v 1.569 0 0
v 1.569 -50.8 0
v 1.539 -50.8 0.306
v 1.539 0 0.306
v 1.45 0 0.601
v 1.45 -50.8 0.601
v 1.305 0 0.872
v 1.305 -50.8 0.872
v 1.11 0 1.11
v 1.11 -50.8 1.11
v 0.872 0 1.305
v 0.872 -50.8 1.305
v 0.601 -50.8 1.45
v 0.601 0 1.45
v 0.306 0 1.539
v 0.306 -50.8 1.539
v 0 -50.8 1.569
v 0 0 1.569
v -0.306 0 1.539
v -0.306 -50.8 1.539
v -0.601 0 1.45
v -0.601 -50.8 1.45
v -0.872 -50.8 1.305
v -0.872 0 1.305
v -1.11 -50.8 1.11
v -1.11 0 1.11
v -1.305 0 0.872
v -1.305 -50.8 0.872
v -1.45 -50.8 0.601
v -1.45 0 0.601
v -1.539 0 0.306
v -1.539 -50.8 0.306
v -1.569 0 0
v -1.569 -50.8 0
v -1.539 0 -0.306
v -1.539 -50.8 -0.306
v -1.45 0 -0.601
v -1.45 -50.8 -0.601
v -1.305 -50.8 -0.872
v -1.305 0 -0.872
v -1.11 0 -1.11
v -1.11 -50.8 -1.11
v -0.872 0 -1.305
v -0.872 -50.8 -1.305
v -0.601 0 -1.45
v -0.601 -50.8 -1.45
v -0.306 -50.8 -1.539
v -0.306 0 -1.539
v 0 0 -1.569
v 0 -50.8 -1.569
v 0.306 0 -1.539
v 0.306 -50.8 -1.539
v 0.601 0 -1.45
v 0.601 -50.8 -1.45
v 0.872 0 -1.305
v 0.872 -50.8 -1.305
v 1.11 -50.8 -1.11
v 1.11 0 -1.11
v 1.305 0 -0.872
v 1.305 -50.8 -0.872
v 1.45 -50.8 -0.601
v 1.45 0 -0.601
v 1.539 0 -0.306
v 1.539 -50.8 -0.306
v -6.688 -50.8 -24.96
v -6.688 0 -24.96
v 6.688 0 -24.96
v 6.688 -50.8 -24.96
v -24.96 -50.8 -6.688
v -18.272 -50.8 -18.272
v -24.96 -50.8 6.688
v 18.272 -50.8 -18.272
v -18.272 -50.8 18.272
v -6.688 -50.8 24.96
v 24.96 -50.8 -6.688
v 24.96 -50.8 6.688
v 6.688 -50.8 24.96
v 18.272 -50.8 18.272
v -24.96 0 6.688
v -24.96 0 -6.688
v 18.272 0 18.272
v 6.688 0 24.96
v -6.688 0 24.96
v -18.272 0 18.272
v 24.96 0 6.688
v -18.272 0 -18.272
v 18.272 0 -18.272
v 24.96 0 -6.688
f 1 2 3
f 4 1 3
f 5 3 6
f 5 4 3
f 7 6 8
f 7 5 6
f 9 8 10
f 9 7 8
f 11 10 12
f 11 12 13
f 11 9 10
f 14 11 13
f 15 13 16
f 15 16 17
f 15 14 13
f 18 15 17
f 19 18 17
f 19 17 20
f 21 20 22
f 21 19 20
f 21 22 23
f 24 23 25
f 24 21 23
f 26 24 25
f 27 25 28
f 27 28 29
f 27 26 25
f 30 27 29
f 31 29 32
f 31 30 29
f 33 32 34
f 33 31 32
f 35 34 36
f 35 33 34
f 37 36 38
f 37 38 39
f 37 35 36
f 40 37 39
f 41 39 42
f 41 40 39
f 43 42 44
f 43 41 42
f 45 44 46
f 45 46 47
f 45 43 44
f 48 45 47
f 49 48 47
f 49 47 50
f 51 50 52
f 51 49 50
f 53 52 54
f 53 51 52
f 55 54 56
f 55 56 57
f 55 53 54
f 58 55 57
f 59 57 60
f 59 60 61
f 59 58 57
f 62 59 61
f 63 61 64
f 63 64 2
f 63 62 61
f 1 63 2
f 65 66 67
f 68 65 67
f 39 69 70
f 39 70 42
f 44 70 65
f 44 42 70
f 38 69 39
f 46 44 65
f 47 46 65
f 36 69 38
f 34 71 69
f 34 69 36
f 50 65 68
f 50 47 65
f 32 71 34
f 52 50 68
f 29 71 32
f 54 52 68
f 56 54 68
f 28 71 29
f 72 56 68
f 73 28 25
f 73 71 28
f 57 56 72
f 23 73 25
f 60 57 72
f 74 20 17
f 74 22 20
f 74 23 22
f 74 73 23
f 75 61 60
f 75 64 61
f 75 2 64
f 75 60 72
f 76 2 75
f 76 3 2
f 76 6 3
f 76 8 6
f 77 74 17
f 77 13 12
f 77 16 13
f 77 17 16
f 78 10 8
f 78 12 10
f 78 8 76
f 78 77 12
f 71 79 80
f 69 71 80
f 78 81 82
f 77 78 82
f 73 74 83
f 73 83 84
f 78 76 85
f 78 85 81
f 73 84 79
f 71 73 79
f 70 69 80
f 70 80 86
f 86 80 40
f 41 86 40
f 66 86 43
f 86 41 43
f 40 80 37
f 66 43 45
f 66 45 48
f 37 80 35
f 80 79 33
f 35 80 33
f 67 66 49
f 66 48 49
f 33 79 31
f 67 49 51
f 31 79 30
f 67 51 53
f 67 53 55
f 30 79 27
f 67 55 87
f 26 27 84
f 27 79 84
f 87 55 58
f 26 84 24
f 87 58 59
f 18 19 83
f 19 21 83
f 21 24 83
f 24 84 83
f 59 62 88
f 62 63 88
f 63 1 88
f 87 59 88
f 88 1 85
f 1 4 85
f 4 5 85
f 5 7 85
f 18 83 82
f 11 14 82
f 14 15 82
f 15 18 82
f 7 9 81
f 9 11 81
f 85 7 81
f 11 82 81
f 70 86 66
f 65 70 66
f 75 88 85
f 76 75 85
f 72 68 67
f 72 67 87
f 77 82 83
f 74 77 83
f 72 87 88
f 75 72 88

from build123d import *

# Parameters (mm, degrees)
F0_R     = 1.5694812218
F1_DEPTH = 50.8


# Not quite as in the source:
# - a feature names something its author has since deleted; it is built from what else it names


with BuildPart() as f1:
    # F0 (on Front) → F1 (new body)
    with BuildSketch(Plane.XZ):
        Polygon((6.6879468774, 24.9597575449), (-6.6879468774, 24.9597575449), (-18.2718106675, 18.2718106675), (-24.9597575449, 6.6879468774), (-24.9597575449, -6.6879468774), (-18.2718106675, -18.2718106675), (-6.6879468774, -24.9597575449), (6.6879468774, -24.9597575449), (18.2718106675, -18.2718106675), (24.9597575449, -6.6879468774), (24.9597575449, 6.6879468774), (18.2718106675, 18.2718106675), align=None)
        Circle(F0_R, mode=Mode.SUBTRACT)
    extrude(amount=F1_DEPTH)


solid = f1.part
